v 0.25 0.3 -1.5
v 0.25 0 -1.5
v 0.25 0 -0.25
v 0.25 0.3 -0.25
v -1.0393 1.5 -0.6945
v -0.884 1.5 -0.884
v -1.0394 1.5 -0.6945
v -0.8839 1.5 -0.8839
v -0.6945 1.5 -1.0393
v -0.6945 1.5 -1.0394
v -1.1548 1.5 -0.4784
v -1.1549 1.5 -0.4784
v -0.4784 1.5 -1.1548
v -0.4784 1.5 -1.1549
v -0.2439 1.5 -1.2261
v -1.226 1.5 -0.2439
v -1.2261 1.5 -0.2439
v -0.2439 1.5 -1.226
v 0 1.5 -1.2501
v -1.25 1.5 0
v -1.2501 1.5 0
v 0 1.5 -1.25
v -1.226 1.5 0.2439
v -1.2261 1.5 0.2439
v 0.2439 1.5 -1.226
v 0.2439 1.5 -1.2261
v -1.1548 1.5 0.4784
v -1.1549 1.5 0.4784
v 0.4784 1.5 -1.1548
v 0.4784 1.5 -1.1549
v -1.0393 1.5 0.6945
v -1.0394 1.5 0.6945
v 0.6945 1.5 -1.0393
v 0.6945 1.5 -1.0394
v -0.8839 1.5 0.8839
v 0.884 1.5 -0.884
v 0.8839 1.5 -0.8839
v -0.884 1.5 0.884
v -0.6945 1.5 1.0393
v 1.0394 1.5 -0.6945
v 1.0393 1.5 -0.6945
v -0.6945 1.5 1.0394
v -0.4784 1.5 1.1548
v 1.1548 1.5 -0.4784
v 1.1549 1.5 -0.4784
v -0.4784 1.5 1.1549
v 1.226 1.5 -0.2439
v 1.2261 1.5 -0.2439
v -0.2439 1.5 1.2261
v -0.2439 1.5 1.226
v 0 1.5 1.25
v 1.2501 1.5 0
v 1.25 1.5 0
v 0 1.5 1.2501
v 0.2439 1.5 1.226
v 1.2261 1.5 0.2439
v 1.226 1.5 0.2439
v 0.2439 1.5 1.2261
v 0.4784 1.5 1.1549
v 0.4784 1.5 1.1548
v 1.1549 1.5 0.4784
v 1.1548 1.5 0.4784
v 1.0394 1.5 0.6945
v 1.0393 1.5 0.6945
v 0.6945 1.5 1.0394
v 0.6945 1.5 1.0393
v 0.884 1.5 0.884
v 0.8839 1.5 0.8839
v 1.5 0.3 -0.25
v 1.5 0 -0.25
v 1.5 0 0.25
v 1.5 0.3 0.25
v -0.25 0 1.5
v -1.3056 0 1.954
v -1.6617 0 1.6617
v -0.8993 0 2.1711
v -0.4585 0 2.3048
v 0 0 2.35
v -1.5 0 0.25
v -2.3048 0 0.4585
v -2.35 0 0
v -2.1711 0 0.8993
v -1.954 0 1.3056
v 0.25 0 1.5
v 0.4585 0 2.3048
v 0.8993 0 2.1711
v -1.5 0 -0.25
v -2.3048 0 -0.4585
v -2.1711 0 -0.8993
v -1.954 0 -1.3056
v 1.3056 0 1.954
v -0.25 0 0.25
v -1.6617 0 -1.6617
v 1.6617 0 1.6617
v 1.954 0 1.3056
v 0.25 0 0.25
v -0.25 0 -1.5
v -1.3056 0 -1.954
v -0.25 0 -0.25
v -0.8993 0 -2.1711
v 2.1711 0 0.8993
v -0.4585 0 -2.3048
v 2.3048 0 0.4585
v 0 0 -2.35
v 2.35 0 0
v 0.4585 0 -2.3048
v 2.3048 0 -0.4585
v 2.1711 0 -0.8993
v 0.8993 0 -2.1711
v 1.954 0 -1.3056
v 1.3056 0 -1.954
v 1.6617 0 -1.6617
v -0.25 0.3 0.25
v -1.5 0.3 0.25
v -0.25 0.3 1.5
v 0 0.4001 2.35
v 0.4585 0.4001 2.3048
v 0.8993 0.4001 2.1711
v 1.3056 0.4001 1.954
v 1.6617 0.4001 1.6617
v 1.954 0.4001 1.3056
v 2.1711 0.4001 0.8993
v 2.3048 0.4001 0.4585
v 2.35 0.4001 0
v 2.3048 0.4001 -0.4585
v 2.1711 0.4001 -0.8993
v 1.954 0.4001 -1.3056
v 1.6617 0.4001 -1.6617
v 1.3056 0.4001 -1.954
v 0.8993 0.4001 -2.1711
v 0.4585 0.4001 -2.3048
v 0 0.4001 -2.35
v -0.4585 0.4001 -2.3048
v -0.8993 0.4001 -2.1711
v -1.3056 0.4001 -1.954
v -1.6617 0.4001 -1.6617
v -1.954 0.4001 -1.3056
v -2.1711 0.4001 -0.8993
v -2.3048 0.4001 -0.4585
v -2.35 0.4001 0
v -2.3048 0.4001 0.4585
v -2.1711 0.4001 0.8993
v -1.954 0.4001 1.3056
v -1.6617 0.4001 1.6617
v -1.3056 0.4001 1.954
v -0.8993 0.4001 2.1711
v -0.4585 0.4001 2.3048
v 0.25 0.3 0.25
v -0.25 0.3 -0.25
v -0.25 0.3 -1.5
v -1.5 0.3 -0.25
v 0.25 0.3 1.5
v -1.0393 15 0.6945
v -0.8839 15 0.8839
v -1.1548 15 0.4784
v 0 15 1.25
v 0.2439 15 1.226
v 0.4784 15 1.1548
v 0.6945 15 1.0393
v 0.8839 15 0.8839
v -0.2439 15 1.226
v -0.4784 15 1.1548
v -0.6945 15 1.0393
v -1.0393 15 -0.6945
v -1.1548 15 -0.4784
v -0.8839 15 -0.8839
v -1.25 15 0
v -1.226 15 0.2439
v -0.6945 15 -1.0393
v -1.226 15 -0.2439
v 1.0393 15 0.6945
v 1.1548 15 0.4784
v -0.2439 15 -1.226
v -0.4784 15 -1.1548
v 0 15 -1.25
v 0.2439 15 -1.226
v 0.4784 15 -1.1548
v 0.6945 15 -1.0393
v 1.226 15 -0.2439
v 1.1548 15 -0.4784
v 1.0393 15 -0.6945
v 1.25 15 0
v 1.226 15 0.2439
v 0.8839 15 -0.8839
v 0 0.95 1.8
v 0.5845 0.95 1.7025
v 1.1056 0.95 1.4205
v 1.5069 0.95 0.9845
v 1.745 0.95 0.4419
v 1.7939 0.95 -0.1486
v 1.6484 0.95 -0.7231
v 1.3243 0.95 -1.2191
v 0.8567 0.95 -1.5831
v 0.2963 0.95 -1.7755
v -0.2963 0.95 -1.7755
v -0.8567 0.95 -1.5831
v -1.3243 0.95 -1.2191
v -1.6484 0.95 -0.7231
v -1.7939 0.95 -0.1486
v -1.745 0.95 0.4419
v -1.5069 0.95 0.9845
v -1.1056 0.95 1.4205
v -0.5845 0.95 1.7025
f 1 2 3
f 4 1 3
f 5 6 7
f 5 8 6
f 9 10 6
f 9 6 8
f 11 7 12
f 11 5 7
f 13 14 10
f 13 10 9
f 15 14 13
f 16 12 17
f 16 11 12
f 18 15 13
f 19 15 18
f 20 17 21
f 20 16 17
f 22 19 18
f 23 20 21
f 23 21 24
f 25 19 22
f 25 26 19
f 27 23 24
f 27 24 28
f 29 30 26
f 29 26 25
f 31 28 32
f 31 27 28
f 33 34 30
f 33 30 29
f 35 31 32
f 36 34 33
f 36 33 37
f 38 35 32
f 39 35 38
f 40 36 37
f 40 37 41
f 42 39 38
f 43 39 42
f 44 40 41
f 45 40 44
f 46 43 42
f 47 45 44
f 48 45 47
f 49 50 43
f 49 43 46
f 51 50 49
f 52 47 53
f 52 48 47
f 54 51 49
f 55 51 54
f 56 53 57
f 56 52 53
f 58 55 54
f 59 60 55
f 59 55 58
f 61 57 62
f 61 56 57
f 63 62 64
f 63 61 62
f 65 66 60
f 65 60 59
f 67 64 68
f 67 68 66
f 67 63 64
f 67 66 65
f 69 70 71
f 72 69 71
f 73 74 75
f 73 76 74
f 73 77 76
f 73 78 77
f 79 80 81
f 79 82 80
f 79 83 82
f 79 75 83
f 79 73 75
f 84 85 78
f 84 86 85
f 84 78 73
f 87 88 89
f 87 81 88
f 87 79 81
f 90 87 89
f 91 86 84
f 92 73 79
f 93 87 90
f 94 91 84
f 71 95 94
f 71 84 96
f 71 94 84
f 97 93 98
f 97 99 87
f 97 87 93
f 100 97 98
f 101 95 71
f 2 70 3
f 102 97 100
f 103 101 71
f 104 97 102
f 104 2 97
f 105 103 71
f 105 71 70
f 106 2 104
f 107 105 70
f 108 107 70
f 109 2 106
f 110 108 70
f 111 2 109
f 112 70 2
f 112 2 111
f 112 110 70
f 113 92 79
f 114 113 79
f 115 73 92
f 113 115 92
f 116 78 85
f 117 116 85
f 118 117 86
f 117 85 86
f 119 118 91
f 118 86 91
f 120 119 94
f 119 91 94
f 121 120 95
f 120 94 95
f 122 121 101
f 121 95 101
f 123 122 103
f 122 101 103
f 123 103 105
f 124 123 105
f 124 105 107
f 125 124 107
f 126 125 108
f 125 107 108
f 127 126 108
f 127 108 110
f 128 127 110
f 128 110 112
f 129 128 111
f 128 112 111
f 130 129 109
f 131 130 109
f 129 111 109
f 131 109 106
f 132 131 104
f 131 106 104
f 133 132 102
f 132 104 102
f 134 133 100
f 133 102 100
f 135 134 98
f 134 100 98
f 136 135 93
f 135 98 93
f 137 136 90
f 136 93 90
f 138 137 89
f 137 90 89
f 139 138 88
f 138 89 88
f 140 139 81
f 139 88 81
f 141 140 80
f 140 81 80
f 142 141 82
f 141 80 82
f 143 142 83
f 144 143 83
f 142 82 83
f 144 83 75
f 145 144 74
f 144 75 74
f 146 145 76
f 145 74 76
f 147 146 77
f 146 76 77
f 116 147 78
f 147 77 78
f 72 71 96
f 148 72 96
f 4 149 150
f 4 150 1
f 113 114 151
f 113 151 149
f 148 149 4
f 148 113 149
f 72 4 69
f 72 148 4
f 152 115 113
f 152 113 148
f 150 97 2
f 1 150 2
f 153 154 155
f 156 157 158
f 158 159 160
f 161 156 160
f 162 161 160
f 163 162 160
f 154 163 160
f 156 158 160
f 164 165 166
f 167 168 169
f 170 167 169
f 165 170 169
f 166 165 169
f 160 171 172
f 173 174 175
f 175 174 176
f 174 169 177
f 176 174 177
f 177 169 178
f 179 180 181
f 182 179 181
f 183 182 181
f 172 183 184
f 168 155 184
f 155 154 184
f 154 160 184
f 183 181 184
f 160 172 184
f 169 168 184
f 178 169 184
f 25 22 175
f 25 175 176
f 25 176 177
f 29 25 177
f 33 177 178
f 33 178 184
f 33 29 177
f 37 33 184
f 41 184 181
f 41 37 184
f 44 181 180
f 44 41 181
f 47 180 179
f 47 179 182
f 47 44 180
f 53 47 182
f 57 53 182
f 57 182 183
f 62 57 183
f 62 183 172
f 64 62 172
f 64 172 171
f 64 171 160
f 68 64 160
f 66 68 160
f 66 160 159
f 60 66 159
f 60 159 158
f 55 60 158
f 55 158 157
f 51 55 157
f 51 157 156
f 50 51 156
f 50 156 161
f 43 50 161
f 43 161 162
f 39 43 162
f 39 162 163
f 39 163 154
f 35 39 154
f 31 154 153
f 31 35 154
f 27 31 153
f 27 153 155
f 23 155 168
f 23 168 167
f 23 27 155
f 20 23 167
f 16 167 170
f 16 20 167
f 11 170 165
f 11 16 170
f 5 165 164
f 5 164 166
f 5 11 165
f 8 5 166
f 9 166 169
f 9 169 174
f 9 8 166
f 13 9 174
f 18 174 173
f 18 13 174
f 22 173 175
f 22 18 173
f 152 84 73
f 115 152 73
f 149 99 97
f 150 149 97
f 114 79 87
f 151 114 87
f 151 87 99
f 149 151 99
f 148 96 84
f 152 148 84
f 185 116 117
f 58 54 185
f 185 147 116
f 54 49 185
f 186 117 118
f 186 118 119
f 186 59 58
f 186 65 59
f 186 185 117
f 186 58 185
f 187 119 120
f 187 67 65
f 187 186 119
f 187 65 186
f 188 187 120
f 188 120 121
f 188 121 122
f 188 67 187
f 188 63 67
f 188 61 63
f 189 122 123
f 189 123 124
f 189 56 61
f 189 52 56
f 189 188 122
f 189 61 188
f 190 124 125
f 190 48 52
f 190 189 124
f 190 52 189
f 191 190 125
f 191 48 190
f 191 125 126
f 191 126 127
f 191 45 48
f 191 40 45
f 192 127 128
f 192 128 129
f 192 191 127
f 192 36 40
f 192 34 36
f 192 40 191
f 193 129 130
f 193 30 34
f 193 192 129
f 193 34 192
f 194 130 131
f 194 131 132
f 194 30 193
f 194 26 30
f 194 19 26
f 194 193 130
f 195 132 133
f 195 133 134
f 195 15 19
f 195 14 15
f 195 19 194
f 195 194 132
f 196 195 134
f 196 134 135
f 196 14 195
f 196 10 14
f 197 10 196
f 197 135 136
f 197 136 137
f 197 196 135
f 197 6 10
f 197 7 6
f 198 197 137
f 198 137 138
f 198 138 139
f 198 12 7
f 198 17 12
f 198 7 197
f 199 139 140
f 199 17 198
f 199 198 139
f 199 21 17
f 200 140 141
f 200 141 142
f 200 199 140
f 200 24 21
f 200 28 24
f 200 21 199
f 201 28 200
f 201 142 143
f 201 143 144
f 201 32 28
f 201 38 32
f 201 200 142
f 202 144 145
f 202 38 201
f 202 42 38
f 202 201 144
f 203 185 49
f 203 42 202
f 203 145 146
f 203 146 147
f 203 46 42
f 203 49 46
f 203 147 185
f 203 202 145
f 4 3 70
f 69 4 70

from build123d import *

# Parameters (mm, degrees)
SKETCH1_R           = 2.35
BOSS_EXTRUDE1_DEPTH = 1.5
SKETCH2_R           = 1.25
BOSS_EXTRUDE2_DEPTH = 15
CHAMFER1_SIZE       = 1.1
CUT_EXTRUDE1_DEPTH  = 0.3


with BuildPart() as part:
    # Sketch1 → Boss-Extrude1 (new body)
    with BuildSketch(Plane(origin=(0, 0, 0), x_dir=(1, 0, 0), z_dir=(0, 1, 0))):
        with Locations(Location((0, 0, 0), (0, 0, 270))):
            Circle(SKETCH1_R)
    extrude(amount=BOSS_EXTRUDE1_DEPTH)

    # Sketch2 → Boss-Extrude2 (add)
    with BuildSketch(Plane.XZ):
        with Locations(Location((0, 0, 0), (0, 0, 270))):
            Circle(SKETCH2_R)
    extrude(amount=-BOSS_EXTRUDE2_DEPTH)

    # Chamfer1
    chamfer1_edges = [part.edges().sort_by_distance(p)[0] for p in [
        (0, 1.5, -2.35),
    ]]
    chamfer(chamfer1_edges, length=CHAMFER1_SIZE - 0.0001)  # a hair under: the kernel refuses the full size

    # Sketch3 → Cut-Extrude1 (cut)
    with BuildSketch(Plane.XZ):
        Polygon((-0.25, 1.5), (-0.25, 0.25), (-1.5, 0.25), (-1.5, -0.25), (-0.25, -0.25), (-0.25, -1.5), (0.25, -1.5), (0.25, -0.25), (1.5, -0.25), (1.5, 0.25), (0.25, 0.25), (0.25, 1.5), align=None)
    extrude(amount=-CUT_EXTRUDE1_DEPTH, mode=Mode.SUBTRACT)


solid = part.part
